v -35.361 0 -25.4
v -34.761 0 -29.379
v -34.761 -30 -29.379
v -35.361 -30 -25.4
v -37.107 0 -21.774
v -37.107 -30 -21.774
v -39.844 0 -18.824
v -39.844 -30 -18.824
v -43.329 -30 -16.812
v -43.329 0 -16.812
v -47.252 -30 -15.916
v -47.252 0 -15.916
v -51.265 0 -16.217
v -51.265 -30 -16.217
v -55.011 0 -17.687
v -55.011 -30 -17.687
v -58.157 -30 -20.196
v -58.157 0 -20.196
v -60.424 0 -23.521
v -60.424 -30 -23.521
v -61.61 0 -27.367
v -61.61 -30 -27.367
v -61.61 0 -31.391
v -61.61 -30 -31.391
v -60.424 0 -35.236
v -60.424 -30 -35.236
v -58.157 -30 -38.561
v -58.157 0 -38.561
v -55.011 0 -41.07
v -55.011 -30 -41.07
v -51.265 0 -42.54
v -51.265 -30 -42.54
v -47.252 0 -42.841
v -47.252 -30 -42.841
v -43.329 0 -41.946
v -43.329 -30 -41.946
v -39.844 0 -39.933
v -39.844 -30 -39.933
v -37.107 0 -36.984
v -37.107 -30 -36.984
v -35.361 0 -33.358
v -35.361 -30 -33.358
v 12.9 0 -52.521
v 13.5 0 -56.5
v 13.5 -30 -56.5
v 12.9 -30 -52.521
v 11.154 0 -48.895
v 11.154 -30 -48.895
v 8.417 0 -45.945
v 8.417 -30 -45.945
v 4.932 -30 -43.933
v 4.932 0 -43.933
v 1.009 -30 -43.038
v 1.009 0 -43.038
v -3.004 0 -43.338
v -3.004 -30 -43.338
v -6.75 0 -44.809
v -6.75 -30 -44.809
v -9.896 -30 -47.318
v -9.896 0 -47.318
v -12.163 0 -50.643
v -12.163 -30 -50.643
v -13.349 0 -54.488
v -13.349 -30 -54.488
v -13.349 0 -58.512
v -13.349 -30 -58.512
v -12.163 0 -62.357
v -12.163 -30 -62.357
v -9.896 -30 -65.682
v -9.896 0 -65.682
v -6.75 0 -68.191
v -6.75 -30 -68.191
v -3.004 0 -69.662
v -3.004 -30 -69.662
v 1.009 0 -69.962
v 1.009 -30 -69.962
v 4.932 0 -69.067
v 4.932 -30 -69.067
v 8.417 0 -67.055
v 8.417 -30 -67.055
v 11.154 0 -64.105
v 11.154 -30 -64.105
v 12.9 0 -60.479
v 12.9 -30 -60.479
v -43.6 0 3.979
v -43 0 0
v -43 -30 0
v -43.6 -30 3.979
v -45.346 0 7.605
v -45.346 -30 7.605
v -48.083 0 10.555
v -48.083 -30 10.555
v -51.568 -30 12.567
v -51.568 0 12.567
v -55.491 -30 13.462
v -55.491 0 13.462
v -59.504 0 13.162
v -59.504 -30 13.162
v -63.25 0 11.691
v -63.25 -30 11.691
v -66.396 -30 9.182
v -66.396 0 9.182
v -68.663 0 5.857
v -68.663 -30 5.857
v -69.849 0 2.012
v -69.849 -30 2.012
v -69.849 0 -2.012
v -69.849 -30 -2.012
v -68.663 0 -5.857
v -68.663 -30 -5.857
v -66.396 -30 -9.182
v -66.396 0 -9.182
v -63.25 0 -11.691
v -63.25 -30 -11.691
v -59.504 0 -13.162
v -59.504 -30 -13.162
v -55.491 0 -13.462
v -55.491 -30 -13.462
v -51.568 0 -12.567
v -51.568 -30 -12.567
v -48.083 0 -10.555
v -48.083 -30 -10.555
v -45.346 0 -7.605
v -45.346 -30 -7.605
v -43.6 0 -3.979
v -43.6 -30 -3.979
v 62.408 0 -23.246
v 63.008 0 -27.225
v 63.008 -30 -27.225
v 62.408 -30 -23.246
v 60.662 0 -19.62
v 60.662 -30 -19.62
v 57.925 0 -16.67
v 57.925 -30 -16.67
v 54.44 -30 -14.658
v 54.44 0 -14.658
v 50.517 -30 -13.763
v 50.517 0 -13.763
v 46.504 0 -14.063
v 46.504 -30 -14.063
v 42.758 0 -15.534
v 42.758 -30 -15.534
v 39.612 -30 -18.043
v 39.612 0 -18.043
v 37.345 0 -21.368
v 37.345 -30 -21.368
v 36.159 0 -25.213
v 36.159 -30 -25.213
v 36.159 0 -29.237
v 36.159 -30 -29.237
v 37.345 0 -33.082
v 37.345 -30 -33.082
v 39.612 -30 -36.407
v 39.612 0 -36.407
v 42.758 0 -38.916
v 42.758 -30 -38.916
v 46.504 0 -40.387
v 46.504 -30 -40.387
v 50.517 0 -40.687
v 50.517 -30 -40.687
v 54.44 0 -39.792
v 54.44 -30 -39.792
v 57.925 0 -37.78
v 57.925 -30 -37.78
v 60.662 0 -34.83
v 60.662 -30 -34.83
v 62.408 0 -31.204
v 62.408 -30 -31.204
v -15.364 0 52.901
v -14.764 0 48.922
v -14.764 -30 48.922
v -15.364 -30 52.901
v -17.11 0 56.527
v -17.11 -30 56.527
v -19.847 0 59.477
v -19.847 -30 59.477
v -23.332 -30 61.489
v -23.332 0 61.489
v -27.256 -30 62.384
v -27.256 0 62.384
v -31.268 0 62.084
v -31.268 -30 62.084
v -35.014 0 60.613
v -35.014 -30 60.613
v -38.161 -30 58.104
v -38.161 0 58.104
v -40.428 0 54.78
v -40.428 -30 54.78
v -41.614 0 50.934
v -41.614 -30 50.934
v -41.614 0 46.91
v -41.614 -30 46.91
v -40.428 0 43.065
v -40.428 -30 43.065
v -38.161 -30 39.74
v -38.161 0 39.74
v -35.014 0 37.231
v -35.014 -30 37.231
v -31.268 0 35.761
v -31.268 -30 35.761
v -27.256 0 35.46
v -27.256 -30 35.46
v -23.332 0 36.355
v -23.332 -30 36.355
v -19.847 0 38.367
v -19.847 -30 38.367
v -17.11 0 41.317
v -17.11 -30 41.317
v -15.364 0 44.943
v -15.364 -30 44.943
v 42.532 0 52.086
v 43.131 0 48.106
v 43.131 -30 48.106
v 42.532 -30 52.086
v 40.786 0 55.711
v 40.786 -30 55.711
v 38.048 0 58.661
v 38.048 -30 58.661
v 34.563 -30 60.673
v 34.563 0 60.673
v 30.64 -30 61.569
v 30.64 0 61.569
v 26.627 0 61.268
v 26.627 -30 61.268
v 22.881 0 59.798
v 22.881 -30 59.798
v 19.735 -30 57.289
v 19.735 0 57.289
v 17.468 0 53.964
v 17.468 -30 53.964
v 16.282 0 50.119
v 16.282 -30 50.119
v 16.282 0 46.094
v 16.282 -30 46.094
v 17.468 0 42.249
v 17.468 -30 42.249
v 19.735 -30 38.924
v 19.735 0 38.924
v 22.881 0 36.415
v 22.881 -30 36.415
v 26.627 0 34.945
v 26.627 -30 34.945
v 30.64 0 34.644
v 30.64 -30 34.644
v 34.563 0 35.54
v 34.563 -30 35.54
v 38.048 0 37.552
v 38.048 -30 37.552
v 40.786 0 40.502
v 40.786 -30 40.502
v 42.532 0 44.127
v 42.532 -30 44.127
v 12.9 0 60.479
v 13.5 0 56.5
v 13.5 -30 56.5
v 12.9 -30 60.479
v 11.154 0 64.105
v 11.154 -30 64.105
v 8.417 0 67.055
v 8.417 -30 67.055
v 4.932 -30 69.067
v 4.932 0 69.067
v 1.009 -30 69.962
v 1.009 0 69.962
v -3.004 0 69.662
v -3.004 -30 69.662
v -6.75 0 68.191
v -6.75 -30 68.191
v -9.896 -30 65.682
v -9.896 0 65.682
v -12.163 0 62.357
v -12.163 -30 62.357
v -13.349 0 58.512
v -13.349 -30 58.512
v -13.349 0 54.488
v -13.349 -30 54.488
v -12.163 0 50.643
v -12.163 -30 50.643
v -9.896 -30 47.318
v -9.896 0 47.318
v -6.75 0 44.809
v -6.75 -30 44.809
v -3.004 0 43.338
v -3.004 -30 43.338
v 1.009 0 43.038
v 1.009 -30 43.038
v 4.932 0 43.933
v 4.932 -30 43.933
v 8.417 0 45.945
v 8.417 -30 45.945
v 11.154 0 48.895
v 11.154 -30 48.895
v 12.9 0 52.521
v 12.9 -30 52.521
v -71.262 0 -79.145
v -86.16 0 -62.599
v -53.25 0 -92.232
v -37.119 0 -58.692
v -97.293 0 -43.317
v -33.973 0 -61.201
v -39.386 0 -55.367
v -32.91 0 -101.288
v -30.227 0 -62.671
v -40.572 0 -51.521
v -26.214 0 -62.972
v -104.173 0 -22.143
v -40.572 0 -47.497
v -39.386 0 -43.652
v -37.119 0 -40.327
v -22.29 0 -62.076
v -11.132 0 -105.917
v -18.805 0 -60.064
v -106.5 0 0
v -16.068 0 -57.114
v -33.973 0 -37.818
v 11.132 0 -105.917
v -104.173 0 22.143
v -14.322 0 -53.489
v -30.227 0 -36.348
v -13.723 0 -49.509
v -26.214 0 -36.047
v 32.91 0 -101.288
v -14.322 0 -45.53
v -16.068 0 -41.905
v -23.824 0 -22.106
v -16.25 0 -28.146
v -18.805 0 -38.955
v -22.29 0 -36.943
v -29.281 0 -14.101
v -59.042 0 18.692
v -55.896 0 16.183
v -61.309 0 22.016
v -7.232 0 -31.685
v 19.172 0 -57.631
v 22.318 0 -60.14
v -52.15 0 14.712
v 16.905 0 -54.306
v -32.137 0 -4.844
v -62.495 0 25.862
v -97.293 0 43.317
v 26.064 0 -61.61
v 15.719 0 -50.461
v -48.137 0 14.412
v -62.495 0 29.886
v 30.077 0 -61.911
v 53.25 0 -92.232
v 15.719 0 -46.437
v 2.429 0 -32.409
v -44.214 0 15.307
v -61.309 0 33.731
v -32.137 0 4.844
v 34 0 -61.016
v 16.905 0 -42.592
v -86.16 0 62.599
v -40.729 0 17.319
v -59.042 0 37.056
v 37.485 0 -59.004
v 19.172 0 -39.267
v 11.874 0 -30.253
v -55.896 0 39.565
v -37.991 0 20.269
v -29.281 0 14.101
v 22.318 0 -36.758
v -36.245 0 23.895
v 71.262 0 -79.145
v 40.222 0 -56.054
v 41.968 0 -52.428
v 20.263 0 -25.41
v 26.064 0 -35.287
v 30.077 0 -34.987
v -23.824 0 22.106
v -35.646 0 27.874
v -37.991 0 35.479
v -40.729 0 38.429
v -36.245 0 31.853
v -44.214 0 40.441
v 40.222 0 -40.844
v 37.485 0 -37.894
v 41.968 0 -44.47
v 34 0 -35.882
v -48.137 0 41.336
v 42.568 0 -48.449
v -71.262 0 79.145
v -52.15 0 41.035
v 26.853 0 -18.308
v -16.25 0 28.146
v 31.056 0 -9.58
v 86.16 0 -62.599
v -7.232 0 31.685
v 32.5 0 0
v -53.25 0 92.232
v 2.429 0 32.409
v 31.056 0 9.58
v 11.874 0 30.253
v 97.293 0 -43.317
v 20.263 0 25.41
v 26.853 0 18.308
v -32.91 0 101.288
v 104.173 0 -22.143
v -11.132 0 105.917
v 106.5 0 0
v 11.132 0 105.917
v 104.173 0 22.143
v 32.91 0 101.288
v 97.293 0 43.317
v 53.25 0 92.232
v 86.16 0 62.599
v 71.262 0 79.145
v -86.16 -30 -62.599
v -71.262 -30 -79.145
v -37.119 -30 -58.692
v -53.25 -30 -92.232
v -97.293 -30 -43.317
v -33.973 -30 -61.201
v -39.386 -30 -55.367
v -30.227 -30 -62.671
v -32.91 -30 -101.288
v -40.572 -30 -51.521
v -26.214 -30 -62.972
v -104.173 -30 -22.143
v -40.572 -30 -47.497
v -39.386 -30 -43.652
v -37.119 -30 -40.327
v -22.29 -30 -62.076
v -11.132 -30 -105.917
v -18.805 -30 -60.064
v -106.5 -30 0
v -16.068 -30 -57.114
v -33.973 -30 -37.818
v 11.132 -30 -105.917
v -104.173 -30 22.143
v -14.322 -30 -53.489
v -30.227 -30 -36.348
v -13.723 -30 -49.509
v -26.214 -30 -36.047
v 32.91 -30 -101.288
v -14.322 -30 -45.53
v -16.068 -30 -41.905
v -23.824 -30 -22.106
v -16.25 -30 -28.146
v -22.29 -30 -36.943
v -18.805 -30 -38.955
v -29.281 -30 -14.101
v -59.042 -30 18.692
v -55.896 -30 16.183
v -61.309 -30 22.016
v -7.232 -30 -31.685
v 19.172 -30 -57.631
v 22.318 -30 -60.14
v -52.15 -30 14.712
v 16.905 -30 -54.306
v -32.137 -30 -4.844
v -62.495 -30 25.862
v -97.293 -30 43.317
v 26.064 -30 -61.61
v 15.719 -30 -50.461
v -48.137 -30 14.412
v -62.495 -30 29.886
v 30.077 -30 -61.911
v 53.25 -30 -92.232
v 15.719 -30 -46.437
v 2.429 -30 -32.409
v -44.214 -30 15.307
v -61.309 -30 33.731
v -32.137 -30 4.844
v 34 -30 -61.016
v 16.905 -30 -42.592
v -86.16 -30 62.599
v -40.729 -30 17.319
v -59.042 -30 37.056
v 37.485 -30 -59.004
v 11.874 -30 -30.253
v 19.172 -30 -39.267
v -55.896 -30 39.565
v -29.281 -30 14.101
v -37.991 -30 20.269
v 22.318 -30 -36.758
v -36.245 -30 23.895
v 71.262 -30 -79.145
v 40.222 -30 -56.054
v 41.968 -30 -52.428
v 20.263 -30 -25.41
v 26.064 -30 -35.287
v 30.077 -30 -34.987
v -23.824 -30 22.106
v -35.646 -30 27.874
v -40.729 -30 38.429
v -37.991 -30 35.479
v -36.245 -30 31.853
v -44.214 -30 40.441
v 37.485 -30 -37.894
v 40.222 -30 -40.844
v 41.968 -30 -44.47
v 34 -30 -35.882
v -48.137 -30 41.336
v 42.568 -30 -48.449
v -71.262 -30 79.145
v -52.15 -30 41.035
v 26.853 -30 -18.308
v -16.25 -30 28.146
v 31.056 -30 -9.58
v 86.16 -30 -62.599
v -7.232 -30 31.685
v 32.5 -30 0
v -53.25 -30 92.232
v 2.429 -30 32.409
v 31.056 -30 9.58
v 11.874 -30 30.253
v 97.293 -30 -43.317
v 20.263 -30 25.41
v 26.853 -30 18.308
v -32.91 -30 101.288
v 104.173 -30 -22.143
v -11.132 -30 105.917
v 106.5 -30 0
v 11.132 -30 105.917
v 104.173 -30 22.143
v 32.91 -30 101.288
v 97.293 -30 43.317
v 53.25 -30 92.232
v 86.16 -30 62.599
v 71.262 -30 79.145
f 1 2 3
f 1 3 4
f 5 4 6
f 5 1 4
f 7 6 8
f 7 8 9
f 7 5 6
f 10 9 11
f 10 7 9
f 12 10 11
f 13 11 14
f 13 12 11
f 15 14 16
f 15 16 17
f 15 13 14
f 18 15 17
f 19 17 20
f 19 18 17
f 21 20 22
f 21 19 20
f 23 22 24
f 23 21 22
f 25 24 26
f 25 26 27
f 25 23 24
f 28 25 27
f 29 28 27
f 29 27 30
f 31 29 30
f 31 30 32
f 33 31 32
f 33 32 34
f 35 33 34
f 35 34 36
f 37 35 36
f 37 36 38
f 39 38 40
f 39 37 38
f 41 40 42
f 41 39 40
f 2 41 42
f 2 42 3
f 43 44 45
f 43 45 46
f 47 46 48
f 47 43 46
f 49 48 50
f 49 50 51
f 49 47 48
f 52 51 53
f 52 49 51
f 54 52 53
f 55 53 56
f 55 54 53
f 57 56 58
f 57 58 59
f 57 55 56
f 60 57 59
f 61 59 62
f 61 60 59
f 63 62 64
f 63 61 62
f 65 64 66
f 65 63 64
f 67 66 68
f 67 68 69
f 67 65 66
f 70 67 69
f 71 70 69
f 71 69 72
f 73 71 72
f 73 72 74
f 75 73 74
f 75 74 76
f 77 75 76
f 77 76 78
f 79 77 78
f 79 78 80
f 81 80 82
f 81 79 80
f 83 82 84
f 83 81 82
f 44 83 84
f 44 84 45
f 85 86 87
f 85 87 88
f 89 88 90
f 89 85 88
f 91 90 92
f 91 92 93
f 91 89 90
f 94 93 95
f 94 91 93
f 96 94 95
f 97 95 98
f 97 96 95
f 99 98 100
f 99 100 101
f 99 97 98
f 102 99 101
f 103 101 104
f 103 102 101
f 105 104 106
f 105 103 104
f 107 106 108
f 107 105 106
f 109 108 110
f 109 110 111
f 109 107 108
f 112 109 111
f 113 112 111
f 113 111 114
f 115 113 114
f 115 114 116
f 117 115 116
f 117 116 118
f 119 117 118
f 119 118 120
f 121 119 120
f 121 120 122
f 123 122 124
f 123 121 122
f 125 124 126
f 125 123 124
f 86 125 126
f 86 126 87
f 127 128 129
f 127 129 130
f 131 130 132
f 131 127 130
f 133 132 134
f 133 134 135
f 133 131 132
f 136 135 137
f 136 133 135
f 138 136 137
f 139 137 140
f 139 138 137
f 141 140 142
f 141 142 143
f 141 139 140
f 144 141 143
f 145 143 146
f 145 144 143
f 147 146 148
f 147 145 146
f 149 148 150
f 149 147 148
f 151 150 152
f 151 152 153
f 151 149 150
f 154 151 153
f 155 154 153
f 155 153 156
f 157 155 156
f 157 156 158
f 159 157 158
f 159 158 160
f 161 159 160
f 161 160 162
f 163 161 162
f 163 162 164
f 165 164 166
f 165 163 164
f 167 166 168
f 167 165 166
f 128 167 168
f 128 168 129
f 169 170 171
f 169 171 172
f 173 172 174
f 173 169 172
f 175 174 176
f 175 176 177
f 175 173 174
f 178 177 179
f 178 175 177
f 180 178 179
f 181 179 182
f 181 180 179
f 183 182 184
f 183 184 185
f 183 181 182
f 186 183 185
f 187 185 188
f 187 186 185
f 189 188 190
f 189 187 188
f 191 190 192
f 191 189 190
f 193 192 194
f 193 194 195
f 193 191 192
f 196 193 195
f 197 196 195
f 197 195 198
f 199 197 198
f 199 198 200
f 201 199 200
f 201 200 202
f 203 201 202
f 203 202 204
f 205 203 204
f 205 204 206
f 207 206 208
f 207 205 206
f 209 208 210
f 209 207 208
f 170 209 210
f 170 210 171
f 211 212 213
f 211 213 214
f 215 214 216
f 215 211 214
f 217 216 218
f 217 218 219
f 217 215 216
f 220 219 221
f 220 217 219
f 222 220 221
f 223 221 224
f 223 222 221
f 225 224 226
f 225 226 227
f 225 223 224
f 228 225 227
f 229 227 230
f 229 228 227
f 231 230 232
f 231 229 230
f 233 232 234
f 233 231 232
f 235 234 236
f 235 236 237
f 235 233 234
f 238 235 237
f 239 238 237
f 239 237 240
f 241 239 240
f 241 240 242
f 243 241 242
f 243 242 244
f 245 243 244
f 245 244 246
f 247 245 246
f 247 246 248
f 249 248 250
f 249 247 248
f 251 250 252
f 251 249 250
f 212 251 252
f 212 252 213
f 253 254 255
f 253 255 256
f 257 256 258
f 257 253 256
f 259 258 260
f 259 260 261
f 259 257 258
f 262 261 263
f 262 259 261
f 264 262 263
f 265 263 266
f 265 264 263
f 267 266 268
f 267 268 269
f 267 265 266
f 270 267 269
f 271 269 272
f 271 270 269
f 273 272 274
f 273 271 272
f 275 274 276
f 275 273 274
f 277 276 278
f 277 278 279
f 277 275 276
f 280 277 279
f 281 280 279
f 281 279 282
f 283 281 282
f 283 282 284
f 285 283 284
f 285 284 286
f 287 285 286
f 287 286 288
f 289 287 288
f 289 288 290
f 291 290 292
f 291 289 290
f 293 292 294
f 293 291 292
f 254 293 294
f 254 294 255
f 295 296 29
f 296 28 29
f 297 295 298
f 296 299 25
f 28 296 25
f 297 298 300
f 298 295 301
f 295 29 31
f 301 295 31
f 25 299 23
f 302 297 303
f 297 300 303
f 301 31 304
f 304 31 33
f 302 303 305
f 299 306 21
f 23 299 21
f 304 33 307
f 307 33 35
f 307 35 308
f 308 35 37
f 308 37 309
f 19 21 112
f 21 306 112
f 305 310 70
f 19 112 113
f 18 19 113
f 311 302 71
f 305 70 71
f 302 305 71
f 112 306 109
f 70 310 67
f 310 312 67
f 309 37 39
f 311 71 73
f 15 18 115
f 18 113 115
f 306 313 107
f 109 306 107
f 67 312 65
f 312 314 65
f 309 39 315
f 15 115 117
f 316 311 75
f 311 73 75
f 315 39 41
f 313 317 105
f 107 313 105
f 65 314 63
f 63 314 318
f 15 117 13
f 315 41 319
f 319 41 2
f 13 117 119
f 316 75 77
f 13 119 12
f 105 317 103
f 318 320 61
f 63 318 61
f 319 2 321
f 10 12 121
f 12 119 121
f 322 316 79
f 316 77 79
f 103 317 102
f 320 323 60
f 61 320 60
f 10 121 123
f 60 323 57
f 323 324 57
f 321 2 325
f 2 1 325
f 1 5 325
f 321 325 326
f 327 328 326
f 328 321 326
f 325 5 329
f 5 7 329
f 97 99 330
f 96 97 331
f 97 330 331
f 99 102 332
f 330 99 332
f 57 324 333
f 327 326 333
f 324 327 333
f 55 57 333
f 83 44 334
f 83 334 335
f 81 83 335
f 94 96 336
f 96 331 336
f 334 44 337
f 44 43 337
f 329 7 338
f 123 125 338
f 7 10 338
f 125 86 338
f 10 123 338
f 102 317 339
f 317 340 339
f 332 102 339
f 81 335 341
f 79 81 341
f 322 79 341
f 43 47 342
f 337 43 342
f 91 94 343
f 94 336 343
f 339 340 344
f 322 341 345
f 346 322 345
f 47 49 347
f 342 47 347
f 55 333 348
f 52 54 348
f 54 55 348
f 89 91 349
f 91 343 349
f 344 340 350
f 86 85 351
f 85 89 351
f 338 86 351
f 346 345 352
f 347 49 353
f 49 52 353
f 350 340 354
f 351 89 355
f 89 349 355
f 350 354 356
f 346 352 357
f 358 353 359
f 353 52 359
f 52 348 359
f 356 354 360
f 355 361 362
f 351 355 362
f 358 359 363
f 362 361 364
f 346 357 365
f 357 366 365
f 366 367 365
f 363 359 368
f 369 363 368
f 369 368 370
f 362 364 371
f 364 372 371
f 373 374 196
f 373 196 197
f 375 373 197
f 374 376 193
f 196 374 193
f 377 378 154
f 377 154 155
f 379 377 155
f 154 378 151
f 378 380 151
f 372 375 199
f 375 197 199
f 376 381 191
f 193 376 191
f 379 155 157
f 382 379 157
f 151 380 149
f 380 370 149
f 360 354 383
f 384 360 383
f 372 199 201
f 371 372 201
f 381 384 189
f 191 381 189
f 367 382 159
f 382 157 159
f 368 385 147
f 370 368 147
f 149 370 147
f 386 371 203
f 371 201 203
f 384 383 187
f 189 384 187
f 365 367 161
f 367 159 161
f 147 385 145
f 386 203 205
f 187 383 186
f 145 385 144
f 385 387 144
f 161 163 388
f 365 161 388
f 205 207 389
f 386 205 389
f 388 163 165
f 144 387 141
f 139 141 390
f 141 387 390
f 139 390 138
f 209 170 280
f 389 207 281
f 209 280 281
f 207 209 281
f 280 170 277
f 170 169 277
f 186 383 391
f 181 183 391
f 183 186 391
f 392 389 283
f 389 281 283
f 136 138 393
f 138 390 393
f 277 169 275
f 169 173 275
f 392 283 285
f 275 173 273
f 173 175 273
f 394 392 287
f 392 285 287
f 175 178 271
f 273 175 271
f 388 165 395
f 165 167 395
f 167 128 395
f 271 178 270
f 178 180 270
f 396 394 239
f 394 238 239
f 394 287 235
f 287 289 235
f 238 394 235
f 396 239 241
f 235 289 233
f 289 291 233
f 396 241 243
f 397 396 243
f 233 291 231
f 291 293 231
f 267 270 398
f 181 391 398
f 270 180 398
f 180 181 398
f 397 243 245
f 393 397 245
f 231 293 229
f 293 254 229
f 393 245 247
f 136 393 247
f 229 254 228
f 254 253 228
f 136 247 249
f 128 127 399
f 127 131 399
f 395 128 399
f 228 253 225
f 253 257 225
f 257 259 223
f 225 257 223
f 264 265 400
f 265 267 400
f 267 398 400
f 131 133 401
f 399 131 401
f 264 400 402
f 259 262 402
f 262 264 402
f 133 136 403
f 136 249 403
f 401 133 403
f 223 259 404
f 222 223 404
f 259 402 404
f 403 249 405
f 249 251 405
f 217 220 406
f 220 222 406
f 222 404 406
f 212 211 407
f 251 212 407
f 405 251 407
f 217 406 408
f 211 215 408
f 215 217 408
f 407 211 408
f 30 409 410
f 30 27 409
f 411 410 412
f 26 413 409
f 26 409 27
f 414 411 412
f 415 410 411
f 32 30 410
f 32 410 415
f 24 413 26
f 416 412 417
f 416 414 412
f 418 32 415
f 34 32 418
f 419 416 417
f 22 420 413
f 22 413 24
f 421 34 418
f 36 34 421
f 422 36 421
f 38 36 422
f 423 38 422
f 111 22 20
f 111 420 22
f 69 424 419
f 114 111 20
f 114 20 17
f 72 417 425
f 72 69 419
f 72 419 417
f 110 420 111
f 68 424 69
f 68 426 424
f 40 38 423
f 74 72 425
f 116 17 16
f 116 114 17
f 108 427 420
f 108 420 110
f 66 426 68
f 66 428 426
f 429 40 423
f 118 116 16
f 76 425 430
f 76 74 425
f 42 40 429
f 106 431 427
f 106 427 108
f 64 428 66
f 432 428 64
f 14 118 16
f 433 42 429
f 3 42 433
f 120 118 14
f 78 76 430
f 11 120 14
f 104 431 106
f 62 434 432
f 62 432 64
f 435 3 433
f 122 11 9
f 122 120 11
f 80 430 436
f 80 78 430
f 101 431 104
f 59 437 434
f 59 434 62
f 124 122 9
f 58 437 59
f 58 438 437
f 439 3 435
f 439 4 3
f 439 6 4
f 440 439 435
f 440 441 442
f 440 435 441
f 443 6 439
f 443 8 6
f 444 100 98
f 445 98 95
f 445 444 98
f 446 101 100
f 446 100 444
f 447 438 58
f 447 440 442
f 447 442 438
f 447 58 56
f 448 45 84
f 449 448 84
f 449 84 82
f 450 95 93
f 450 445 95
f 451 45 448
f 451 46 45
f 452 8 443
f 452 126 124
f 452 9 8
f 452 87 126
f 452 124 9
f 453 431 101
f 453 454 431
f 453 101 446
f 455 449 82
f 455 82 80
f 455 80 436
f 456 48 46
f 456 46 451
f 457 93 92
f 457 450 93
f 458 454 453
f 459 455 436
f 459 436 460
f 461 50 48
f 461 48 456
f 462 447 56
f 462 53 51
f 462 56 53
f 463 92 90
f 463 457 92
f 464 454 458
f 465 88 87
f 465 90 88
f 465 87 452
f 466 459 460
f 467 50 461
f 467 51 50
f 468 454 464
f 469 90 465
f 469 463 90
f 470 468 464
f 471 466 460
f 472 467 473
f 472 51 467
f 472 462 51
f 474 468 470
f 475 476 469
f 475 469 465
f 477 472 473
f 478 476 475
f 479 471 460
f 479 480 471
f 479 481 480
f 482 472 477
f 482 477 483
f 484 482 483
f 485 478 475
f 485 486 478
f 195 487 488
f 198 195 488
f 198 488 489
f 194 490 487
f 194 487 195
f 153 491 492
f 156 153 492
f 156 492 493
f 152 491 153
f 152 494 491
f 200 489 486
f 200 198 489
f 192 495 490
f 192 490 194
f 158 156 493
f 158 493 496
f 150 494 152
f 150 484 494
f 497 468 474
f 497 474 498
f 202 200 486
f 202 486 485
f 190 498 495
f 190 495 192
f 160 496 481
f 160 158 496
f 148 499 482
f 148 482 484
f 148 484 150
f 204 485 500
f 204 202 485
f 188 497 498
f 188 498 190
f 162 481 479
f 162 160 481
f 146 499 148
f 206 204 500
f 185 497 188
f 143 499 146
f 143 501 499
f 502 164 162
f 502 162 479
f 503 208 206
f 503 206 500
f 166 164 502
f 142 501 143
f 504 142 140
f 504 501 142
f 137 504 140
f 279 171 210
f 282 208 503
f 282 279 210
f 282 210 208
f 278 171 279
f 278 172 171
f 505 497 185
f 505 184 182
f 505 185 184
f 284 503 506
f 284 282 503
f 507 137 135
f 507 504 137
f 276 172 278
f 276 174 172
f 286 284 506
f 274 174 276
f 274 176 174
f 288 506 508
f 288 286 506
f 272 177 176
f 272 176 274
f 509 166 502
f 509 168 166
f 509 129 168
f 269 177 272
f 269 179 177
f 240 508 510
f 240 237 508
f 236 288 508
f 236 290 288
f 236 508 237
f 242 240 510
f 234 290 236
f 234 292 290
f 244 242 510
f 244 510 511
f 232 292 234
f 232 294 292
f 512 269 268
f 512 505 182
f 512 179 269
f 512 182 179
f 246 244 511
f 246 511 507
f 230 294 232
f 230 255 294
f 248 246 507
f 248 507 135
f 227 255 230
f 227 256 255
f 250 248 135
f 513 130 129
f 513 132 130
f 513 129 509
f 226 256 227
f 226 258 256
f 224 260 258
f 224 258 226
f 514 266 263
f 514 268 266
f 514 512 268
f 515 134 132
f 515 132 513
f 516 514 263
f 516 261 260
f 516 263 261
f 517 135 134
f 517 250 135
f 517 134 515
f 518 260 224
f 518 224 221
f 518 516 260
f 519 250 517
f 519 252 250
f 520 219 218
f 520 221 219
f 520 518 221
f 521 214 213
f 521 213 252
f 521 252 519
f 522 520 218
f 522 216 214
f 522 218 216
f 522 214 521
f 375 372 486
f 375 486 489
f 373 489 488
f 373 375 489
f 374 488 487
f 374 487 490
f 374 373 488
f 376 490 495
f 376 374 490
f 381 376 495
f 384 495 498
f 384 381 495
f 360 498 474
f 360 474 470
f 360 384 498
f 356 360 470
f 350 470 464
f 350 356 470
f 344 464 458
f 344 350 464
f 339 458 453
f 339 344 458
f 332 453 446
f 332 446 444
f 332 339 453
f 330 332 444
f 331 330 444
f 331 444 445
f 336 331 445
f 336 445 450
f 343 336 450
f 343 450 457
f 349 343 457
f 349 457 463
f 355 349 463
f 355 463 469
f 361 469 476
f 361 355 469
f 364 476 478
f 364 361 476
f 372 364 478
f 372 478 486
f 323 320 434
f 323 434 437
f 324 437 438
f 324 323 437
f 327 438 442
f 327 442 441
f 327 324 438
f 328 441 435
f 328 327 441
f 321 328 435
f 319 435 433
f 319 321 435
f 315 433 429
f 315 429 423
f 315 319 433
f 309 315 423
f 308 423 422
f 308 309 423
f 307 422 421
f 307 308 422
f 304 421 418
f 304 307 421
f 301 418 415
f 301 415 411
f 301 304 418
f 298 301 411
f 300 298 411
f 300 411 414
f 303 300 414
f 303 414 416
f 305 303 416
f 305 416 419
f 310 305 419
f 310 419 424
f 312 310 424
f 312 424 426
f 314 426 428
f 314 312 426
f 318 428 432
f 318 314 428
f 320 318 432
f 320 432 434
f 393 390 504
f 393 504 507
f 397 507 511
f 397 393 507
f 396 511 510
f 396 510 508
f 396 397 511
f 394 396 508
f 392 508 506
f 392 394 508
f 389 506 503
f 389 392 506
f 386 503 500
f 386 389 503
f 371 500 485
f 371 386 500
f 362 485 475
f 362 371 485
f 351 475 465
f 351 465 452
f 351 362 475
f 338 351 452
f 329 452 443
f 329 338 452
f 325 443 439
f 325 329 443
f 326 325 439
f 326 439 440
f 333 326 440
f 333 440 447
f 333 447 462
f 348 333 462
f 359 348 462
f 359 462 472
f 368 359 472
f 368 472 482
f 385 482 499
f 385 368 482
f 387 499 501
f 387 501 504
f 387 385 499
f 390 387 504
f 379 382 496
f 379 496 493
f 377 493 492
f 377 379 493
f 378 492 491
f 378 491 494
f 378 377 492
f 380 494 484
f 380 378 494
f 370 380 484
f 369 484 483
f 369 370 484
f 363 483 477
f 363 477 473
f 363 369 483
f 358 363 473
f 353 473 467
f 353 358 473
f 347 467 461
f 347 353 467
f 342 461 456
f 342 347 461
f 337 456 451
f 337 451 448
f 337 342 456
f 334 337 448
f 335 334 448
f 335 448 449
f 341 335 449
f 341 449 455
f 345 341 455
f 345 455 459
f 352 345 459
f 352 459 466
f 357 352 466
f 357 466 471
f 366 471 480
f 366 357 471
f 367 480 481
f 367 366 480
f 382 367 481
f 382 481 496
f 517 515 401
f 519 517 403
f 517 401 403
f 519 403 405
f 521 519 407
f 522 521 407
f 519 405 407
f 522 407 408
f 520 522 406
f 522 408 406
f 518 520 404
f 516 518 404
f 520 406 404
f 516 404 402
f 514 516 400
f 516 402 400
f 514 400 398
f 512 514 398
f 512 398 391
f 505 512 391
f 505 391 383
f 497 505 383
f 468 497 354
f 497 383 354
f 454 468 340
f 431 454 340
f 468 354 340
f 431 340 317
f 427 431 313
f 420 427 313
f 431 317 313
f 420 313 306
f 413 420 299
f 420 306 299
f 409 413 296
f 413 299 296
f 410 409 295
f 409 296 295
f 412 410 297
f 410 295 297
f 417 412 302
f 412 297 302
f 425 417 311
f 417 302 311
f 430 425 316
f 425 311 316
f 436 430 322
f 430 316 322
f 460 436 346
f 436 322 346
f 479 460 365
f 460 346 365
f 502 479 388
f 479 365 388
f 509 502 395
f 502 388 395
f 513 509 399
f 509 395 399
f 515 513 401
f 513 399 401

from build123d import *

# Parameters (mm, degrees)
F0_R     = 106.5
F0_R_2   = 75
F0_R_3   = 13.5
F0_R_4   = 37.5
F0_R_5   = 32.5
F1_DEPTH = 30


with BuildPart() as f1:
    # F0 (on Front) → F1 (new body)
    with BuildSketch(Plane.XZ):
        Circle(F0_R)
        Circle(F0_R_2, mode=Mode.SUBTRACT)
        Circle(F0_R_2)
        with Locations((-27.2225671893, -49.5094115863)):
            Circle(F0_R_3, mode=Mode.SUBTRACT)
        with Locations((-48.2611707722, -29.3787235205)):
            Circle(F0_R_3, mode=Mode.SUBTRACT)
        with Locations((0, -56.5)):
            Circle(F0_R_3, mode=Mode.SUBTRACT)
        with Locations((29.0680028111, -48.4489547108)):
            Circle(F0_R_3, mode=Mode.SUBTRACT)
        with Locations((49.5080817216, -27.2249856611)):
            Circle(F0_R_3, mode=Mode.SUBTRACT)
        with Locations((-56.5, 0)):
            Circle(F0_R_3, mode=Mode.SUBTRACT)
        with Locations((-49.1456532959, 27.8739082678)):
            Circle(F0_R_3, mode=Mode.SUBTRACT)
        with Locations((-28.2644325552, 48.9220998357)):
            Circle(F0_R_3, mode=Mode.SUBTRACT)
        Circle(F0_R_4, mode=Mode.SUBTRACT)
        with Locations((29.631335914, 48.1064853419)):
            Circle(F0_R_3, mode=Mode.SUBTRACT)
        with Locations((0, 56.5)):
            Circle(F0_R_3, mode=Mode.SUBTRACT)
        Circle(F0_R_4)
        Circle(F0_R_5, mode=Mode.SUBTRACT)
    extrude(amount=F1_DEPTH)


solid = f1.part
